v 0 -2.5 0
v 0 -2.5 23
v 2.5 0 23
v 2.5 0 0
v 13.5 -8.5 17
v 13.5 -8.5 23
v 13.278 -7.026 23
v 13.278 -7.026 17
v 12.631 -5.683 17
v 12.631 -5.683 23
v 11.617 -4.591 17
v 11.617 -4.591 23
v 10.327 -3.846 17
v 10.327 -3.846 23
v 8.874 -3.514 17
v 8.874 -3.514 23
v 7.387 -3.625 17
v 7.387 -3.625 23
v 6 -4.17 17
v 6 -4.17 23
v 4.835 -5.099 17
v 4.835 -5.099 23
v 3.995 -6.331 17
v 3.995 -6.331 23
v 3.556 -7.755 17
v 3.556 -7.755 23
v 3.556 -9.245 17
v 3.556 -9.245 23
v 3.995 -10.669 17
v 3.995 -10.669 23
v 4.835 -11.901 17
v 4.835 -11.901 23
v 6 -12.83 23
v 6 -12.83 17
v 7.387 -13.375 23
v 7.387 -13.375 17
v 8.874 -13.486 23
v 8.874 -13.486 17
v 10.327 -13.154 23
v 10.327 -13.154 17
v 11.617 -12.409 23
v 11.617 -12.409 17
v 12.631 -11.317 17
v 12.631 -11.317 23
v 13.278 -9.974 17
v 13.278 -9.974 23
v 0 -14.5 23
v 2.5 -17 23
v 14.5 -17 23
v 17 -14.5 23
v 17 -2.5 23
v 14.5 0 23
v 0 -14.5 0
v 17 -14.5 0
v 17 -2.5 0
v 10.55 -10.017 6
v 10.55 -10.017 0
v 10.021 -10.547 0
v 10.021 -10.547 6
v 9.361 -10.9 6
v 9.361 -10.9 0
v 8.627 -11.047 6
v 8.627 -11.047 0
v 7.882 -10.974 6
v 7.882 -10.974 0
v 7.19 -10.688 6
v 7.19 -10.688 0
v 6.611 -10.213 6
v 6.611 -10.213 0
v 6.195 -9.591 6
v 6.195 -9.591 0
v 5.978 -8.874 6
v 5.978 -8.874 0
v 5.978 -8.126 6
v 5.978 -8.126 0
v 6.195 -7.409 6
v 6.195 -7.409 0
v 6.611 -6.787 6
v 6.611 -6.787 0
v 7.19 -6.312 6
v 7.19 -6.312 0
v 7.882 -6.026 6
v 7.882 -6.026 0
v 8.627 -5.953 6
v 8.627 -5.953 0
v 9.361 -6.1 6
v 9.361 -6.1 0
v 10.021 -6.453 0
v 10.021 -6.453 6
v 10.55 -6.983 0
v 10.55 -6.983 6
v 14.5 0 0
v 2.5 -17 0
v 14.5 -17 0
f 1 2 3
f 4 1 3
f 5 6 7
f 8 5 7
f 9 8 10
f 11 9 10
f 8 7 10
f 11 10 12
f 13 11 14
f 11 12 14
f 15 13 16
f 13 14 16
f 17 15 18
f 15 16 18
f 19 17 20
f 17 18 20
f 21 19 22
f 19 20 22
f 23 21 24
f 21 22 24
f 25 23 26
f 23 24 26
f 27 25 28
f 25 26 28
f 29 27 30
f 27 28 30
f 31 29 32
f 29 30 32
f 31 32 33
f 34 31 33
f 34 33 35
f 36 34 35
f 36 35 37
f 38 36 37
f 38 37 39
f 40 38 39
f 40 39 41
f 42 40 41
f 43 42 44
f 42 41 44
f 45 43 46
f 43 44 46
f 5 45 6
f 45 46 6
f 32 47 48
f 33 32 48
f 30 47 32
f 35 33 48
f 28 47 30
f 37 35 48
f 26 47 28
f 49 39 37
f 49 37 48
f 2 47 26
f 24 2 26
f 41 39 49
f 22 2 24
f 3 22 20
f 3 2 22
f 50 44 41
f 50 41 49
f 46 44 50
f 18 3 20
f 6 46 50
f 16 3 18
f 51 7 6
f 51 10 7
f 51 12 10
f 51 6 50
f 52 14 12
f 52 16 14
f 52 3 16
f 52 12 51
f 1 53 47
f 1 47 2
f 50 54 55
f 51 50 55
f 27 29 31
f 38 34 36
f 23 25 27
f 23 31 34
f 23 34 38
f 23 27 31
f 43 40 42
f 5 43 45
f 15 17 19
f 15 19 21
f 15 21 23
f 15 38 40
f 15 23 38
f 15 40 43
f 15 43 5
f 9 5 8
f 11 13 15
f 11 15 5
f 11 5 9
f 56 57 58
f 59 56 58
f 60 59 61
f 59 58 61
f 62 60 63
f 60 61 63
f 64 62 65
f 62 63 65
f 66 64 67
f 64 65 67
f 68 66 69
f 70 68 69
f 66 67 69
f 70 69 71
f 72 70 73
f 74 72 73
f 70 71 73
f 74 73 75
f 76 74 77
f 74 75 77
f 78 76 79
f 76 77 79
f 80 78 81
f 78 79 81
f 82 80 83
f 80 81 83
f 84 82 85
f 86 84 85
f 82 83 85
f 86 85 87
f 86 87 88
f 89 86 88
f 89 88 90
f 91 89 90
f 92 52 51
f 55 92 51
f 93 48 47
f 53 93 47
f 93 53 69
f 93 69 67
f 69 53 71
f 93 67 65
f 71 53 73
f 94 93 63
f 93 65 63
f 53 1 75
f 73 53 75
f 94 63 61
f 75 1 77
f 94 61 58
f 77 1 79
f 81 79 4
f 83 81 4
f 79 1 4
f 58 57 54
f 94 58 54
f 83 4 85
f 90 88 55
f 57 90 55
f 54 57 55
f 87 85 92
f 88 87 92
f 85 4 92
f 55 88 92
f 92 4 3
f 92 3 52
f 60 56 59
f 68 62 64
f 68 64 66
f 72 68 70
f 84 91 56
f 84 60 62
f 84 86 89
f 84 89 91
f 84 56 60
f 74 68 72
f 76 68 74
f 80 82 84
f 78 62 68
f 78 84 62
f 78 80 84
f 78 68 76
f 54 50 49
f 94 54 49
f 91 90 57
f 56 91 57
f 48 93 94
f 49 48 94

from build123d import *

# Parameters (mm, degrees)
SKETCH3_W           = 17
SKETCH3_H           = 17
BOSS_EXTRUDE1_DEPTH = 23
CUT_EXTRUDE1_DEPTH  = 34.271609519
SKETCH5_R           = 5
CUT_EXTRUDE2_DEPTH  = 6
CUT_EXTRUDE3_DEPTH  = 6


with BuildPart() as part:
    # Sketch3 → Boss-Extrude1 (new body)
    with BuildSketch(Plane.XY):
        with Locations((8.5, -8.5)):
            Rectangle(SKETCH3_W, SKETCH3_H)
    extrude(amount=BOSS_EXTRUDE1_DEPTH)

    # Sketch4 → Cut-Extrude1 (cut, through all)
    with BuildSketch(Plane.XY.offset(23)):
        Polygon((17, 0), (14.5, 0), (17, -2.5), align=None)
        Polygon((0, -2.5), (2.5, 0), (0, 0), align=None)
        Polygon((2.5, -17), (0, -14.5), (0, -17), align=None)
        Polygon((17, -17), (17, -14.5), (14.5, -17), align=None)
    extrude(amount=-CUT_EXTRUDE1_DEPTH, mode=Mode.SUBTRACT)

    # Sketch5 → Cut-Extrude2 (cut)
    with BuildSketch(Plane.XY.offset(23)):
        with Locations((8.5, -8.5)):
            Circle(SKETCH5_R)
    extrude(amount=-CUT_EXTRUDE2_DEPTH, mode=Mode.SUBTRACT)

    # Sketch6 → Cut-Extrude3 (cut)
    with BuildSketch(Plane(origin=(0, 0, 0), x_dir=(-1, 0, 0), z_dir=(0, 0, -1))):
        with BuildLine():
            Line((-10.55, -6.983424911), (-10.55, -10.016575089))
            ThreePointArc((-10.55, -10.016575089), (-5.95, -8.5), (-10.55, -6.983424911))
        make_face()
    extrude(amount=-CUT_EXTRUDE3_DEPTH, mode=Mode.SUBTRACT)


solid = part.part
